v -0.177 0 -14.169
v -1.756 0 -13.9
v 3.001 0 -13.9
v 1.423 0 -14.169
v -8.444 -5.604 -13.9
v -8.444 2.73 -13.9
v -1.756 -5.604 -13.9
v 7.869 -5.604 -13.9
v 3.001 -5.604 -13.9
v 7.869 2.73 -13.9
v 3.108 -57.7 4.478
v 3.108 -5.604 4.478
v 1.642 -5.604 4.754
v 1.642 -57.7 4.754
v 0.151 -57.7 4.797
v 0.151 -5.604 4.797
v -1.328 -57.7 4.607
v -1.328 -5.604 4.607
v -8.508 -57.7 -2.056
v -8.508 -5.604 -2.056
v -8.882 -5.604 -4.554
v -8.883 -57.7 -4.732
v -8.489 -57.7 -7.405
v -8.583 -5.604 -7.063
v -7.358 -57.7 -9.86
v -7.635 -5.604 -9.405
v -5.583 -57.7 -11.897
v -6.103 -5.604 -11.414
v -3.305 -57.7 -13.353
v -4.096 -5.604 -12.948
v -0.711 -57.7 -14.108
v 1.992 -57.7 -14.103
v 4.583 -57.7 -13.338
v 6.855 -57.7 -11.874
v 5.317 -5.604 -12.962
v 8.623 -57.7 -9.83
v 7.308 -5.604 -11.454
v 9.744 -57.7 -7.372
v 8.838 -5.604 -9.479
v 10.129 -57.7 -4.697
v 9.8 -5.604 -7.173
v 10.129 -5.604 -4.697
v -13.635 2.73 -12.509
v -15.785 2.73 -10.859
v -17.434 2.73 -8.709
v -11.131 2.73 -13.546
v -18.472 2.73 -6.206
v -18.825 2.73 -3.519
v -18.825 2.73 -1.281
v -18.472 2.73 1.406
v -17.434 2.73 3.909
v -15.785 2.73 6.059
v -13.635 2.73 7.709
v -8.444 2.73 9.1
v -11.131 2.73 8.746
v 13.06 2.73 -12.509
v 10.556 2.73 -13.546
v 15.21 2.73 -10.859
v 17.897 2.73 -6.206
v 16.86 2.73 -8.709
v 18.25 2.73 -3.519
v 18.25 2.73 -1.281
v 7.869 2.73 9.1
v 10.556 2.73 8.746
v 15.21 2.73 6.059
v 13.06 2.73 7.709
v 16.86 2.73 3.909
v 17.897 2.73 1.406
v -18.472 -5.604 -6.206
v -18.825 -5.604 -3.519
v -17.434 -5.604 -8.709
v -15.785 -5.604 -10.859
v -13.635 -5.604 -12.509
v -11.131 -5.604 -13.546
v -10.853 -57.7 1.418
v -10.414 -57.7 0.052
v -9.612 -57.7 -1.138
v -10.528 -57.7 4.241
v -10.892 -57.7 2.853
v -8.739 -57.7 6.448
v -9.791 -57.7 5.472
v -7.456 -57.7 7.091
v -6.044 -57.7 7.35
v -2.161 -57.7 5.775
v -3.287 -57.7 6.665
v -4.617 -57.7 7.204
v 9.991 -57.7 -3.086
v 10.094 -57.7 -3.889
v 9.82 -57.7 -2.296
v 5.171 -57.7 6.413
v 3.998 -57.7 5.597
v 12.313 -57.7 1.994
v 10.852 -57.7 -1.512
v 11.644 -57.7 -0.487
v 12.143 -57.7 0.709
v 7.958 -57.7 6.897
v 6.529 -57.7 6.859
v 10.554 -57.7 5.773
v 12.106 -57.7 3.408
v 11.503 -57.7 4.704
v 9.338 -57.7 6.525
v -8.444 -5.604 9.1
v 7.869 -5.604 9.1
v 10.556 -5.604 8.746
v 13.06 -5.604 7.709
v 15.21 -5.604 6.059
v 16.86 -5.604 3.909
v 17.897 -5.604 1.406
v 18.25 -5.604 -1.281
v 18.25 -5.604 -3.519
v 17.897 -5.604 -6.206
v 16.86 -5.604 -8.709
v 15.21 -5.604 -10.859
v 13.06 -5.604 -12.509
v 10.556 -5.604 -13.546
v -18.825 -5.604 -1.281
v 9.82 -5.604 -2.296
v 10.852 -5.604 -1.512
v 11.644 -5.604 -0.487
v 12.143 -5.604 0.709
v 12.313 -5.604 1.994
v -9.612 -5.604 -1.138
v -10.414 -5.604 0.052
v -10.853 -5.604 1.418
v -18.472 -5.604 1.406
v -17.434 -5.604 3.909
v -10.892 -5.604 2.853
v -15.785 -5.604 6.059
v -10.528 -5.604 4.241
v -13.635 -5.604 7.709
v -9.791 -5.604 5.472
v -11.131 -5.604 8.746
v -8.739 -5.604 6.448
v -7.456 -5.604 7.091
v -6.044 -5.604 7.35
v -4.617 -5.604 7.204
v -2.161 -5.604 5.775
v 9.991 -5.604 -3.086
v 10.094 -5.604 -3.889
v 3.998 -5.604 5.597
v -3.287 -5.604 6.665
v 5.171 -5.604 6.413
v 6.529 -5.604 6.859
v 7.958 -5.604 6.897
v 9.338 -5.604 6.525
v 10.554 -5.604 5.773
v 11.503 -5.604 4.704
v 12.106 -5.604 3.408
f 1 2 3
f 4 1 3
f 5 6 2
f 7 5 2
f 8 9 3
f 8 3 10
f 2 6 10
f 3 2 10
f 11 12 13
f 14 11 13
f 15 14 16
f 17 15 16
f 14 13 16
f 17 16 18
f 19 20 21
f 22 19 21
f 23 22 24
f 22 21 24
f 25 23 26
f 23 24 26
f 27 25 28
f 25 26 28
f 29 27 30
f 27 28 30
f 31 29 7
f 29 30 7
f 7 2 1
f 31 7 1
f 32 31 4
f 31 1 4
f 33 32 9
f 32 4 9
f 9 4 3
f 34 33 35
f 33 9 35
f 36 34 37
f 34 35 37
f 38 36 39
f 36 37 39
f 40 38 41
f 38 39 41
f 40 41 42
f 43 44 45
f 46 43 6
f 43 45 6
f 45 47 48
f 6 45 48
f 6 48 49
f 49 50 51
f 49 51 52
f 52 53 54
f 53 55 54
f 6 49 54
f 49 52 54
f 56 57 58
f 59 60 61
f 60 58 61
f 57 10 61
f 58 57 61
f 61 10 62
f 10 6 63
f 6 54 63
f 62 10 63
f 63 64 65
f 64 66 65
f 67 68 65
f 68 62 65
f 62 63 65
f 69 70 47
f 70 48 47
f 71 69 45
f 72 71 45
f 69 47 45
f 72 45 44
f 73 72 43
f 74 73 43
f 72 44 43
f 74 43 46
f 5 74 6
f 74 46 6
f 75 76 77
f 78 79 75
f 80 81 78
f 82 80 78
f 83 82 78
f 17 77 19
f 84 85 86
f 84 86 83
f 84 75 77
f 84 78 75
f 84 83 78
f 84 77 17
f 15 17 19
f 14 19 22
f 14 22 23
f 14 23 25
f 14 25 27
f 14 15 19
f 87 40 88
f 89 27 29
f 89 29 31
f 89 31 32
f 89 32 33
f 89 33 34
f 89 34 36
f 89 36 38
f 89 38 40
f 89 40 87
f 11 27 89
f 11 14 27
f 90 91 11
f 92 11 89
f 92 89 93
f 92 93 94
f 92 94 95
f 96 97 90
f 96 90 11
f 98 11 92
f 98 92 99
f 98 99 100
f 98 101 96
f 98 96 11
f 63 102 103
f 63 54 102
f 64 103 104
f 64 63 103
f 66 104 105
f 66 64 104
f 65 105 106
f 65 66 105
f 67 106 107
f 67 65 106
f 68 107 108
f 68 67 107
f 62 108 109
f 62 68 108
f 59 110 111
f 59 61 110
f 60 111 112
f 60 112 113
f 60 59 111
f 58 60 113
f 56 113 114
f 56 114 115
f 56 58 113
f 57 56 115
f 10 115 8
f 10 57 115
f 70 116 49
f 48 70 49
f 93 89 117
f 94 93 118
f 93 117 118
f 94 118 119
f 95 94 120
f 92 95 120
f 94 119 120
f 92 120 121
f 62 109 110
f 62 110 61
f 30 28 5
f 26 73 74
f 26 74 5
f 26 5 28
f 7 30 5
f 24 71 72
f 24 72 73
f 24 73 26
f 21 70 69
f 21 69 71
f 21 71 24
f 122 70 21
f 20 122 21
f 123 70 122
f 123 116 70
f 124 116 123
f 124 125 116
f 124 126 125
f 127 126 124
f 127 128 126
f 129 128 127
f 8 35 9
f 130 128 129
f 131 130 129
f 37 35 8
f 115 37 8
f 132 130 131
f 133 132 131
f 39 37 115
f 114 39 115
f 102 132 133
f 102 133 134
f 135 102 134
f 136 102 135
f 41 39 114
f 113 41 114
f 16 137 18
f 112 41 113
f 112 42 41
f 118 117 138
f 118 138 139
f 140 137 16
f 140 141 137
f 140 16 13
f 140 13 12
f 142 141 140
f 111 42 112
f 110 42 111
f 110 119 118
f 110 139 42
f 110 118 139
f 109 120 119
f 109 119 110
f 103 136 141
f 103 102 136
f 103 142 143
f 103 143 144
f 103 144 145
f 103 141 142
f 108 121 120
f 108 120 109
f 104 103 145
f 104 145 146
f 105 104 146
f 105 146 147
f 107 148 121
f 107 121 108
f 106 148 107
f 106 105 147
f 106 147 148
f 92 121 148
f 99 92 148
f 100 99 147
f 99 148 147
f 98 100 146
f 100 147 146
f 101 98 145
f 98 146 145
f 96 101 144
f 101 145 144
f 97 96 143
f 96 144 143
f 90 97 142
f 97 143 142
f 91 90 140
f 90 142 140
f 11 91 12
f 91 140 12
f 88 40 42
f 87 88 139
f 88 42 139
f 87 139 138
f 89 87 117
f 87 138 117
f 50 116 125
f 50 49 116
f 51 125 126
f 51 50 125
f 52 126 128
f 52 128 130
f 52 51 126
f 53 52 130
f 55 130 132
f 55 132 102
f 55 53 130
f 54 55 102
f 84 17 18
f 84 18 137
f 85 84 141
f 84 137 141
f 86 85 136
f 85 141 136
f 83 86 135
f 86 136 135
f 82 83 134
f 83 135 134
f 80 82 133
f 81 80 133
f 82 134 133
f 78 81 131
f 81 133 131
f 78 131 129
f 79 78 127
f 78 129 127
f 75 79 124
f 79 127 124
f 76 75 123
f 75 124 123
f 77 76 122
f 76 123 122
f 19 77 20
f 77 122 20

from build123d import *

# Parameters (mm, degrees)
F1_DEPTH      = 57.7
F2_W          = 37.0757319033
F2_H          = 8.3348543849
F3_DEPTH      = 9.1
F3_DEPTH_BACK = 13.9
F4_R          = 10.3811183182


with BuildPart() as f1:
    # F0 (on Front) → F1 (new body)
    with BuildSketch(Plane.XZ):
        with BuildLine():
            ThreePointArc((-8.50842429, -2.055534725), (-0.7108667363, -14.1083254953), (10.1285676568, -4.696719299))
            ThreePointArc((10.1285676568, -4.696719299), (10.0511987024, -3.4863896128), (9.8203512915, -2.2957623088))
            ThreePointArc((9.8203512915, -2.2957623088), (3.867574575, -1.4815476648), (3.107728587, 4.4784129221))
            ThreePointArc((3.107728587, 4.4784129221), (0.8974187737, 4.8049632632), (-1.3280566308, 4.6065600879))
            ThreePointArc((-1.3280566308, 4.6065600879), (-0.9040034744, 3.4731229743), (-0.7599296961, 2.2715641883))
            ThreePointArc((-0.7599296961, 2.2715641883), (-3.3643453928, -2.1658605569), (-8.50842429, -2.055534725))
        make_face()
        with BuildLine():
            ThreePointArc((-1.3280566308, 4.6065600879), (-5.8423978144, 2.2715641883), (-8.50842429, -2.055534725))
            ThreePointArc((-8.50842429, -2.055534725), (-3.3643453928, -2.1658605569), (-0.7599296961, 2.2715641883))
            ThreePointArc((-0.7599296961, 2.2715641883), (-0.9040034744, 3.4731229743), (-1.3280566308, 4.6065600879))
        make_face()
        with BuildLine():
            ThreePointArc((3.107728587, 4.4784129221), (3.867574575, -1.4815476648), (9.8203512915, -2.2957623088))
            ThreePointArc((9.8203512915, -2.2957623088), (7.3750342072, 1.9940419619), (3.107728587, 4.4784129221))
        make_face()
        with BuildLine():
            ThreePointArc((3.107728587, 4.4784129221), (7.3750342072, 1.9940419619), (9.8203512915, -2.2957623088))
            ThreePointArc((9.8203512915, -2.2957623088), (11.6444905303, -0.4866311381), (12.3128471161, 1.9940419619))
            ThreePointArc((12.3128471161, 1.9940419619), (8.6616653793, 6.761281892), (3.107728587, 4.4784129221))
        make_face()
        with BuildLine():
            ThreePointArc((-1.3280566308, 4.6065600879), (-9.2992668658, 5.9973578668), (-8.50842429, -2.055534725))
            ThreePointArc((-8.50842429, -2.055534725), (-5.8423978144, 2.2715641883), (-1.3280566308, 4.6065600879))
        make_face()
    extrude(amount=F1_DEPTH)

    # F2 (on Top) → F3 (join, two sides)
    with BuildSketch(Plane.XY) as f3_sk:
        with Locations((-0.2874098718, -1.4370438876)):
            Rectangle(F2_W, F2_H)
    extrude(amount=F3_DEPTH)
    extrude(f3_sk.sketch, amount=-F3_DEPTH_BACK)

    # F4
    f4_edges = [f1.edges().sort_by_distance(p)[0] for p in [
        (-18.825276, -1.437044, -13.9),
        (-18.825276, -1.437044, 9.1),
        (18.250456, -1.437044, 9.1),
        (18.250456, -1.437044, -13.9),
    ]]
    fillet(f4_edges, radius=F4_R)


solid = f1.part
